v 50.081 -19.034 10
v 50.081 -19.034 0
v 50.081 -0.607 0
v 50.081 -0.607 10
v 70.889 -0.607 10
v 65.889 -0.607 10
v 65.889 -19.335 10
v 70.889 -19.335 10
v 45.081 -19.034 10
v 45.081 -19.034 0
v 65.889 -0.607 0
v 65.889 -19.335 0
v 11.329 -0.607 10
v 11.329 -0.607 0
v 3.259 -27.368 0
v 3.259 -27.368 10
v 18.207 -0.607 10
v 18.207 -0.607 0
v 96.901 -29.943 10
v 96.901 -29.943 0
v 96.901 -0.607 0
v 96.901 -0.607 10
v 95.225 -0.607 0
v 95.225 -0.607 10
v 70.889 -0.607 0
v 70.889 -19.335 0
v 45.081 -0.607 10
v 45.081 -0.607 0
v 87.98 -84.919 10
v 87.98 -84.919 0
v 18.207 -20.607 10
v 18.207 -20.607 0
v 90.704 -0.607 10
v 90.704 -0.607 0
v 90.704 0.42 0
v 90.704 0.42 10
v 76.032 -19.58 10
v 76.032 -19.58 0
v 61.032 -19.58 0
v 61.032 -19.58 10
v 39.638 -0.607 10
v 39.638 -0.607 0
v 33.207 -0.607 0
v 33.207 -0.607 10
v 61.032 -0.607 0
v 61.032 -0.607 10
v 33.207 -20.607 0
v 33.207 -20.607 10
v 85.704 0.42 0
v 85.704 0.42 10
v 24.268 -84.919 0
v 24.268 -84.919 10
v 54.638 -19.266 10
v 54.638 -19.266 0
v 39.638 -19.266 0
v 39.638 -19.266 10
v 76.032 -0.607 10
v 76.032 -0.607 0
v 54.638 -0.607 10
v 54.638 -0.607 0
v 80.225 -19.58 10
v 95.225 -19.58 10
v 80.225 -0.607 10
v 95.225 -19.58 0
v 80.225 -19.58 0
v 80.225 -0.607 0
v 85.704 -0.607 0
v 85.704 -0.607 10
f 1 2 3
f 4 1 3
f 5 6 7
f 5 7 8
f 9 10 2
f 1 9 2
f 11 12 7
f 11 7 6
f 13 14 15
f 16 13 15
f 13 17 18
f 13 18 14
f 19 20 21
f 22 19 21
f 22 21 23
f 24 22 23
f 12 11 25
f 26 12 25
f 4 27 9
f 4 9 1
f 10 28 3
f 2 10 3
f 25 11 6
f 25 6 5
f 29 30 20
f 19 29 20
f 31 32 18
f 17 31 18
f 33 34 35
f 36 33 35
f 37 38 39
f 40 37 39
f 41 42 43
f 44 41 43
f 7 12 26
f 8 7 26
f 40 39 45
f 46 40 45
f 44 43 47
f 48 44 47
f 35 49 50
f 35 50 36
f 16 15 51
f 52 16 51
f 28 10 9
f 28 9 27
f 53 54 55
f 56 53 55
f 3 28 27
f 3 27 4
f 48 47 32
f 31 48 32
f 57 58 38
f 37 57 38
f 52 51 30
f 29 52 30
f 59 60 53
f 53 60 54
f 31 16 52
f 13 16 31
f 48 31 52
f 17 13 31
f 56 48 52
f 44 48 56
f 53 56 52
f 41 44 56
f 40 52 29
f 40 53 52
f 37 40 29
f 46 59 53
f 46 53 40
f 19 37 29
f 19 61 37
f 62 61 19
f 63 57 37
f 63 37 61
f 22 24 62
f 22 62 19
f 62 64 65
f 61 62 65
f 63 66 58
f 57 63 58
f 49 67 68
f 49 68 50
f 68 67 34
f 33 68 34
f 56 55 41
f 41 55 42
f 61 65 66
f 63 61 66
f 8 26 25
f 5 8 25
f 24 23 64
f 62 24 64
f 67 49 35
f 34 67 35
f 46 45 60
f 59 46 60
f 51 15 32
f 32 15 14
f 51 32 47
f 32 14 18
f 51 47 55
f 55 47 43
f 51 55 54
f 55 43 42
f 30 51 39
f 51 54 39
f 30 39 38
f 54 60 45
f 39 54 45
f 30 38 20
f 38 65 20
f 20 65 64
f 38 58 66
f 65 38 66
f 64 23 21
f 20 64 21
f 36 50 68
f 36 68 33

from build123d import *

# Parameters (mm, degrees)
F1_DEPTH = 10
F0_W     = 5
F0_H     = 1.0268185272
F0_H_2   = 18.4267202251
F0_H_3   = 18.7282770615


with BuildPart() as f1:
    # F0 (on Top) → F1 (new body)
    with BuildSketch(Plane.XY):
        Polygon((18.2068565833, -0.6069772576), (11.3289707911, -0.6069772576), (3.2589579517, -27.3683114747), (24.2683672618, -84.9190409688), (87.9804774548, -84.9190409688), (96.9007899468, -29.943118357), (96.9007899468, -0.6069772576), (95.2245366573, -0.6069772576), (95.2245366573, -19.5801587304), (90.7042622566, -19.5801587304), (85.7042622566, -19.5801587304), (80.2245366573, -19.5801587304), (80.2245366573, -0.6069772576), (76.032448262, -0.6069772576), (76.032448262, -19.5801581338), (61.032448262, -19.5801581338), (61.032448262, -0.6069772576), (54.6379645169, -0.6069772576), (54.6379645169, -19.2655338085), (39.6379645169, -19.2655338085), (39.6379645169, -0.6069772576), (33.2068565833, -0.6069772576), (33.2068565833, -20.6069772576), (27.8533260524, -20.6069772576), (22.8533260524, -20.6069772576), (18.2068565833, -20.6069772576), align=None)
    extrude(amount=F1_DEPTH)


with BuildPart() as f1b:
    # F0 (on Top) → F1, piece 2 (new body)
    with BuildSketch(Plane.XY):
        with Locations((88.2042622566, -0.093567994)):
            Rectangle(F0_W, F0_H)
    extrude(amount=F1_DEPTH)


with BuildPart() as f1c:
    # F0 (on Top) → F1, piece 3 (new body)
    with BuildSketch(Plane.XY):
        with Locations((47.5812256336, -9.8203373701)):
            Rectangle(F0_W, F0_H_2)
    extrude(amount=F1_DEPTH)


with BuildPart() as f1d:
    # F0 (on Top) → F1, piece 4 (new body)
    with BuildSketch(Plane.XY):
        with Locations((68.3888345957, -9.9711157883)):
            Rectangle(F0_W, F0_H_3)
    extrude(amount=F1_DEPTH)


solid = Compound([f1.part, f1b.part, f1c.part, f1d.part])
